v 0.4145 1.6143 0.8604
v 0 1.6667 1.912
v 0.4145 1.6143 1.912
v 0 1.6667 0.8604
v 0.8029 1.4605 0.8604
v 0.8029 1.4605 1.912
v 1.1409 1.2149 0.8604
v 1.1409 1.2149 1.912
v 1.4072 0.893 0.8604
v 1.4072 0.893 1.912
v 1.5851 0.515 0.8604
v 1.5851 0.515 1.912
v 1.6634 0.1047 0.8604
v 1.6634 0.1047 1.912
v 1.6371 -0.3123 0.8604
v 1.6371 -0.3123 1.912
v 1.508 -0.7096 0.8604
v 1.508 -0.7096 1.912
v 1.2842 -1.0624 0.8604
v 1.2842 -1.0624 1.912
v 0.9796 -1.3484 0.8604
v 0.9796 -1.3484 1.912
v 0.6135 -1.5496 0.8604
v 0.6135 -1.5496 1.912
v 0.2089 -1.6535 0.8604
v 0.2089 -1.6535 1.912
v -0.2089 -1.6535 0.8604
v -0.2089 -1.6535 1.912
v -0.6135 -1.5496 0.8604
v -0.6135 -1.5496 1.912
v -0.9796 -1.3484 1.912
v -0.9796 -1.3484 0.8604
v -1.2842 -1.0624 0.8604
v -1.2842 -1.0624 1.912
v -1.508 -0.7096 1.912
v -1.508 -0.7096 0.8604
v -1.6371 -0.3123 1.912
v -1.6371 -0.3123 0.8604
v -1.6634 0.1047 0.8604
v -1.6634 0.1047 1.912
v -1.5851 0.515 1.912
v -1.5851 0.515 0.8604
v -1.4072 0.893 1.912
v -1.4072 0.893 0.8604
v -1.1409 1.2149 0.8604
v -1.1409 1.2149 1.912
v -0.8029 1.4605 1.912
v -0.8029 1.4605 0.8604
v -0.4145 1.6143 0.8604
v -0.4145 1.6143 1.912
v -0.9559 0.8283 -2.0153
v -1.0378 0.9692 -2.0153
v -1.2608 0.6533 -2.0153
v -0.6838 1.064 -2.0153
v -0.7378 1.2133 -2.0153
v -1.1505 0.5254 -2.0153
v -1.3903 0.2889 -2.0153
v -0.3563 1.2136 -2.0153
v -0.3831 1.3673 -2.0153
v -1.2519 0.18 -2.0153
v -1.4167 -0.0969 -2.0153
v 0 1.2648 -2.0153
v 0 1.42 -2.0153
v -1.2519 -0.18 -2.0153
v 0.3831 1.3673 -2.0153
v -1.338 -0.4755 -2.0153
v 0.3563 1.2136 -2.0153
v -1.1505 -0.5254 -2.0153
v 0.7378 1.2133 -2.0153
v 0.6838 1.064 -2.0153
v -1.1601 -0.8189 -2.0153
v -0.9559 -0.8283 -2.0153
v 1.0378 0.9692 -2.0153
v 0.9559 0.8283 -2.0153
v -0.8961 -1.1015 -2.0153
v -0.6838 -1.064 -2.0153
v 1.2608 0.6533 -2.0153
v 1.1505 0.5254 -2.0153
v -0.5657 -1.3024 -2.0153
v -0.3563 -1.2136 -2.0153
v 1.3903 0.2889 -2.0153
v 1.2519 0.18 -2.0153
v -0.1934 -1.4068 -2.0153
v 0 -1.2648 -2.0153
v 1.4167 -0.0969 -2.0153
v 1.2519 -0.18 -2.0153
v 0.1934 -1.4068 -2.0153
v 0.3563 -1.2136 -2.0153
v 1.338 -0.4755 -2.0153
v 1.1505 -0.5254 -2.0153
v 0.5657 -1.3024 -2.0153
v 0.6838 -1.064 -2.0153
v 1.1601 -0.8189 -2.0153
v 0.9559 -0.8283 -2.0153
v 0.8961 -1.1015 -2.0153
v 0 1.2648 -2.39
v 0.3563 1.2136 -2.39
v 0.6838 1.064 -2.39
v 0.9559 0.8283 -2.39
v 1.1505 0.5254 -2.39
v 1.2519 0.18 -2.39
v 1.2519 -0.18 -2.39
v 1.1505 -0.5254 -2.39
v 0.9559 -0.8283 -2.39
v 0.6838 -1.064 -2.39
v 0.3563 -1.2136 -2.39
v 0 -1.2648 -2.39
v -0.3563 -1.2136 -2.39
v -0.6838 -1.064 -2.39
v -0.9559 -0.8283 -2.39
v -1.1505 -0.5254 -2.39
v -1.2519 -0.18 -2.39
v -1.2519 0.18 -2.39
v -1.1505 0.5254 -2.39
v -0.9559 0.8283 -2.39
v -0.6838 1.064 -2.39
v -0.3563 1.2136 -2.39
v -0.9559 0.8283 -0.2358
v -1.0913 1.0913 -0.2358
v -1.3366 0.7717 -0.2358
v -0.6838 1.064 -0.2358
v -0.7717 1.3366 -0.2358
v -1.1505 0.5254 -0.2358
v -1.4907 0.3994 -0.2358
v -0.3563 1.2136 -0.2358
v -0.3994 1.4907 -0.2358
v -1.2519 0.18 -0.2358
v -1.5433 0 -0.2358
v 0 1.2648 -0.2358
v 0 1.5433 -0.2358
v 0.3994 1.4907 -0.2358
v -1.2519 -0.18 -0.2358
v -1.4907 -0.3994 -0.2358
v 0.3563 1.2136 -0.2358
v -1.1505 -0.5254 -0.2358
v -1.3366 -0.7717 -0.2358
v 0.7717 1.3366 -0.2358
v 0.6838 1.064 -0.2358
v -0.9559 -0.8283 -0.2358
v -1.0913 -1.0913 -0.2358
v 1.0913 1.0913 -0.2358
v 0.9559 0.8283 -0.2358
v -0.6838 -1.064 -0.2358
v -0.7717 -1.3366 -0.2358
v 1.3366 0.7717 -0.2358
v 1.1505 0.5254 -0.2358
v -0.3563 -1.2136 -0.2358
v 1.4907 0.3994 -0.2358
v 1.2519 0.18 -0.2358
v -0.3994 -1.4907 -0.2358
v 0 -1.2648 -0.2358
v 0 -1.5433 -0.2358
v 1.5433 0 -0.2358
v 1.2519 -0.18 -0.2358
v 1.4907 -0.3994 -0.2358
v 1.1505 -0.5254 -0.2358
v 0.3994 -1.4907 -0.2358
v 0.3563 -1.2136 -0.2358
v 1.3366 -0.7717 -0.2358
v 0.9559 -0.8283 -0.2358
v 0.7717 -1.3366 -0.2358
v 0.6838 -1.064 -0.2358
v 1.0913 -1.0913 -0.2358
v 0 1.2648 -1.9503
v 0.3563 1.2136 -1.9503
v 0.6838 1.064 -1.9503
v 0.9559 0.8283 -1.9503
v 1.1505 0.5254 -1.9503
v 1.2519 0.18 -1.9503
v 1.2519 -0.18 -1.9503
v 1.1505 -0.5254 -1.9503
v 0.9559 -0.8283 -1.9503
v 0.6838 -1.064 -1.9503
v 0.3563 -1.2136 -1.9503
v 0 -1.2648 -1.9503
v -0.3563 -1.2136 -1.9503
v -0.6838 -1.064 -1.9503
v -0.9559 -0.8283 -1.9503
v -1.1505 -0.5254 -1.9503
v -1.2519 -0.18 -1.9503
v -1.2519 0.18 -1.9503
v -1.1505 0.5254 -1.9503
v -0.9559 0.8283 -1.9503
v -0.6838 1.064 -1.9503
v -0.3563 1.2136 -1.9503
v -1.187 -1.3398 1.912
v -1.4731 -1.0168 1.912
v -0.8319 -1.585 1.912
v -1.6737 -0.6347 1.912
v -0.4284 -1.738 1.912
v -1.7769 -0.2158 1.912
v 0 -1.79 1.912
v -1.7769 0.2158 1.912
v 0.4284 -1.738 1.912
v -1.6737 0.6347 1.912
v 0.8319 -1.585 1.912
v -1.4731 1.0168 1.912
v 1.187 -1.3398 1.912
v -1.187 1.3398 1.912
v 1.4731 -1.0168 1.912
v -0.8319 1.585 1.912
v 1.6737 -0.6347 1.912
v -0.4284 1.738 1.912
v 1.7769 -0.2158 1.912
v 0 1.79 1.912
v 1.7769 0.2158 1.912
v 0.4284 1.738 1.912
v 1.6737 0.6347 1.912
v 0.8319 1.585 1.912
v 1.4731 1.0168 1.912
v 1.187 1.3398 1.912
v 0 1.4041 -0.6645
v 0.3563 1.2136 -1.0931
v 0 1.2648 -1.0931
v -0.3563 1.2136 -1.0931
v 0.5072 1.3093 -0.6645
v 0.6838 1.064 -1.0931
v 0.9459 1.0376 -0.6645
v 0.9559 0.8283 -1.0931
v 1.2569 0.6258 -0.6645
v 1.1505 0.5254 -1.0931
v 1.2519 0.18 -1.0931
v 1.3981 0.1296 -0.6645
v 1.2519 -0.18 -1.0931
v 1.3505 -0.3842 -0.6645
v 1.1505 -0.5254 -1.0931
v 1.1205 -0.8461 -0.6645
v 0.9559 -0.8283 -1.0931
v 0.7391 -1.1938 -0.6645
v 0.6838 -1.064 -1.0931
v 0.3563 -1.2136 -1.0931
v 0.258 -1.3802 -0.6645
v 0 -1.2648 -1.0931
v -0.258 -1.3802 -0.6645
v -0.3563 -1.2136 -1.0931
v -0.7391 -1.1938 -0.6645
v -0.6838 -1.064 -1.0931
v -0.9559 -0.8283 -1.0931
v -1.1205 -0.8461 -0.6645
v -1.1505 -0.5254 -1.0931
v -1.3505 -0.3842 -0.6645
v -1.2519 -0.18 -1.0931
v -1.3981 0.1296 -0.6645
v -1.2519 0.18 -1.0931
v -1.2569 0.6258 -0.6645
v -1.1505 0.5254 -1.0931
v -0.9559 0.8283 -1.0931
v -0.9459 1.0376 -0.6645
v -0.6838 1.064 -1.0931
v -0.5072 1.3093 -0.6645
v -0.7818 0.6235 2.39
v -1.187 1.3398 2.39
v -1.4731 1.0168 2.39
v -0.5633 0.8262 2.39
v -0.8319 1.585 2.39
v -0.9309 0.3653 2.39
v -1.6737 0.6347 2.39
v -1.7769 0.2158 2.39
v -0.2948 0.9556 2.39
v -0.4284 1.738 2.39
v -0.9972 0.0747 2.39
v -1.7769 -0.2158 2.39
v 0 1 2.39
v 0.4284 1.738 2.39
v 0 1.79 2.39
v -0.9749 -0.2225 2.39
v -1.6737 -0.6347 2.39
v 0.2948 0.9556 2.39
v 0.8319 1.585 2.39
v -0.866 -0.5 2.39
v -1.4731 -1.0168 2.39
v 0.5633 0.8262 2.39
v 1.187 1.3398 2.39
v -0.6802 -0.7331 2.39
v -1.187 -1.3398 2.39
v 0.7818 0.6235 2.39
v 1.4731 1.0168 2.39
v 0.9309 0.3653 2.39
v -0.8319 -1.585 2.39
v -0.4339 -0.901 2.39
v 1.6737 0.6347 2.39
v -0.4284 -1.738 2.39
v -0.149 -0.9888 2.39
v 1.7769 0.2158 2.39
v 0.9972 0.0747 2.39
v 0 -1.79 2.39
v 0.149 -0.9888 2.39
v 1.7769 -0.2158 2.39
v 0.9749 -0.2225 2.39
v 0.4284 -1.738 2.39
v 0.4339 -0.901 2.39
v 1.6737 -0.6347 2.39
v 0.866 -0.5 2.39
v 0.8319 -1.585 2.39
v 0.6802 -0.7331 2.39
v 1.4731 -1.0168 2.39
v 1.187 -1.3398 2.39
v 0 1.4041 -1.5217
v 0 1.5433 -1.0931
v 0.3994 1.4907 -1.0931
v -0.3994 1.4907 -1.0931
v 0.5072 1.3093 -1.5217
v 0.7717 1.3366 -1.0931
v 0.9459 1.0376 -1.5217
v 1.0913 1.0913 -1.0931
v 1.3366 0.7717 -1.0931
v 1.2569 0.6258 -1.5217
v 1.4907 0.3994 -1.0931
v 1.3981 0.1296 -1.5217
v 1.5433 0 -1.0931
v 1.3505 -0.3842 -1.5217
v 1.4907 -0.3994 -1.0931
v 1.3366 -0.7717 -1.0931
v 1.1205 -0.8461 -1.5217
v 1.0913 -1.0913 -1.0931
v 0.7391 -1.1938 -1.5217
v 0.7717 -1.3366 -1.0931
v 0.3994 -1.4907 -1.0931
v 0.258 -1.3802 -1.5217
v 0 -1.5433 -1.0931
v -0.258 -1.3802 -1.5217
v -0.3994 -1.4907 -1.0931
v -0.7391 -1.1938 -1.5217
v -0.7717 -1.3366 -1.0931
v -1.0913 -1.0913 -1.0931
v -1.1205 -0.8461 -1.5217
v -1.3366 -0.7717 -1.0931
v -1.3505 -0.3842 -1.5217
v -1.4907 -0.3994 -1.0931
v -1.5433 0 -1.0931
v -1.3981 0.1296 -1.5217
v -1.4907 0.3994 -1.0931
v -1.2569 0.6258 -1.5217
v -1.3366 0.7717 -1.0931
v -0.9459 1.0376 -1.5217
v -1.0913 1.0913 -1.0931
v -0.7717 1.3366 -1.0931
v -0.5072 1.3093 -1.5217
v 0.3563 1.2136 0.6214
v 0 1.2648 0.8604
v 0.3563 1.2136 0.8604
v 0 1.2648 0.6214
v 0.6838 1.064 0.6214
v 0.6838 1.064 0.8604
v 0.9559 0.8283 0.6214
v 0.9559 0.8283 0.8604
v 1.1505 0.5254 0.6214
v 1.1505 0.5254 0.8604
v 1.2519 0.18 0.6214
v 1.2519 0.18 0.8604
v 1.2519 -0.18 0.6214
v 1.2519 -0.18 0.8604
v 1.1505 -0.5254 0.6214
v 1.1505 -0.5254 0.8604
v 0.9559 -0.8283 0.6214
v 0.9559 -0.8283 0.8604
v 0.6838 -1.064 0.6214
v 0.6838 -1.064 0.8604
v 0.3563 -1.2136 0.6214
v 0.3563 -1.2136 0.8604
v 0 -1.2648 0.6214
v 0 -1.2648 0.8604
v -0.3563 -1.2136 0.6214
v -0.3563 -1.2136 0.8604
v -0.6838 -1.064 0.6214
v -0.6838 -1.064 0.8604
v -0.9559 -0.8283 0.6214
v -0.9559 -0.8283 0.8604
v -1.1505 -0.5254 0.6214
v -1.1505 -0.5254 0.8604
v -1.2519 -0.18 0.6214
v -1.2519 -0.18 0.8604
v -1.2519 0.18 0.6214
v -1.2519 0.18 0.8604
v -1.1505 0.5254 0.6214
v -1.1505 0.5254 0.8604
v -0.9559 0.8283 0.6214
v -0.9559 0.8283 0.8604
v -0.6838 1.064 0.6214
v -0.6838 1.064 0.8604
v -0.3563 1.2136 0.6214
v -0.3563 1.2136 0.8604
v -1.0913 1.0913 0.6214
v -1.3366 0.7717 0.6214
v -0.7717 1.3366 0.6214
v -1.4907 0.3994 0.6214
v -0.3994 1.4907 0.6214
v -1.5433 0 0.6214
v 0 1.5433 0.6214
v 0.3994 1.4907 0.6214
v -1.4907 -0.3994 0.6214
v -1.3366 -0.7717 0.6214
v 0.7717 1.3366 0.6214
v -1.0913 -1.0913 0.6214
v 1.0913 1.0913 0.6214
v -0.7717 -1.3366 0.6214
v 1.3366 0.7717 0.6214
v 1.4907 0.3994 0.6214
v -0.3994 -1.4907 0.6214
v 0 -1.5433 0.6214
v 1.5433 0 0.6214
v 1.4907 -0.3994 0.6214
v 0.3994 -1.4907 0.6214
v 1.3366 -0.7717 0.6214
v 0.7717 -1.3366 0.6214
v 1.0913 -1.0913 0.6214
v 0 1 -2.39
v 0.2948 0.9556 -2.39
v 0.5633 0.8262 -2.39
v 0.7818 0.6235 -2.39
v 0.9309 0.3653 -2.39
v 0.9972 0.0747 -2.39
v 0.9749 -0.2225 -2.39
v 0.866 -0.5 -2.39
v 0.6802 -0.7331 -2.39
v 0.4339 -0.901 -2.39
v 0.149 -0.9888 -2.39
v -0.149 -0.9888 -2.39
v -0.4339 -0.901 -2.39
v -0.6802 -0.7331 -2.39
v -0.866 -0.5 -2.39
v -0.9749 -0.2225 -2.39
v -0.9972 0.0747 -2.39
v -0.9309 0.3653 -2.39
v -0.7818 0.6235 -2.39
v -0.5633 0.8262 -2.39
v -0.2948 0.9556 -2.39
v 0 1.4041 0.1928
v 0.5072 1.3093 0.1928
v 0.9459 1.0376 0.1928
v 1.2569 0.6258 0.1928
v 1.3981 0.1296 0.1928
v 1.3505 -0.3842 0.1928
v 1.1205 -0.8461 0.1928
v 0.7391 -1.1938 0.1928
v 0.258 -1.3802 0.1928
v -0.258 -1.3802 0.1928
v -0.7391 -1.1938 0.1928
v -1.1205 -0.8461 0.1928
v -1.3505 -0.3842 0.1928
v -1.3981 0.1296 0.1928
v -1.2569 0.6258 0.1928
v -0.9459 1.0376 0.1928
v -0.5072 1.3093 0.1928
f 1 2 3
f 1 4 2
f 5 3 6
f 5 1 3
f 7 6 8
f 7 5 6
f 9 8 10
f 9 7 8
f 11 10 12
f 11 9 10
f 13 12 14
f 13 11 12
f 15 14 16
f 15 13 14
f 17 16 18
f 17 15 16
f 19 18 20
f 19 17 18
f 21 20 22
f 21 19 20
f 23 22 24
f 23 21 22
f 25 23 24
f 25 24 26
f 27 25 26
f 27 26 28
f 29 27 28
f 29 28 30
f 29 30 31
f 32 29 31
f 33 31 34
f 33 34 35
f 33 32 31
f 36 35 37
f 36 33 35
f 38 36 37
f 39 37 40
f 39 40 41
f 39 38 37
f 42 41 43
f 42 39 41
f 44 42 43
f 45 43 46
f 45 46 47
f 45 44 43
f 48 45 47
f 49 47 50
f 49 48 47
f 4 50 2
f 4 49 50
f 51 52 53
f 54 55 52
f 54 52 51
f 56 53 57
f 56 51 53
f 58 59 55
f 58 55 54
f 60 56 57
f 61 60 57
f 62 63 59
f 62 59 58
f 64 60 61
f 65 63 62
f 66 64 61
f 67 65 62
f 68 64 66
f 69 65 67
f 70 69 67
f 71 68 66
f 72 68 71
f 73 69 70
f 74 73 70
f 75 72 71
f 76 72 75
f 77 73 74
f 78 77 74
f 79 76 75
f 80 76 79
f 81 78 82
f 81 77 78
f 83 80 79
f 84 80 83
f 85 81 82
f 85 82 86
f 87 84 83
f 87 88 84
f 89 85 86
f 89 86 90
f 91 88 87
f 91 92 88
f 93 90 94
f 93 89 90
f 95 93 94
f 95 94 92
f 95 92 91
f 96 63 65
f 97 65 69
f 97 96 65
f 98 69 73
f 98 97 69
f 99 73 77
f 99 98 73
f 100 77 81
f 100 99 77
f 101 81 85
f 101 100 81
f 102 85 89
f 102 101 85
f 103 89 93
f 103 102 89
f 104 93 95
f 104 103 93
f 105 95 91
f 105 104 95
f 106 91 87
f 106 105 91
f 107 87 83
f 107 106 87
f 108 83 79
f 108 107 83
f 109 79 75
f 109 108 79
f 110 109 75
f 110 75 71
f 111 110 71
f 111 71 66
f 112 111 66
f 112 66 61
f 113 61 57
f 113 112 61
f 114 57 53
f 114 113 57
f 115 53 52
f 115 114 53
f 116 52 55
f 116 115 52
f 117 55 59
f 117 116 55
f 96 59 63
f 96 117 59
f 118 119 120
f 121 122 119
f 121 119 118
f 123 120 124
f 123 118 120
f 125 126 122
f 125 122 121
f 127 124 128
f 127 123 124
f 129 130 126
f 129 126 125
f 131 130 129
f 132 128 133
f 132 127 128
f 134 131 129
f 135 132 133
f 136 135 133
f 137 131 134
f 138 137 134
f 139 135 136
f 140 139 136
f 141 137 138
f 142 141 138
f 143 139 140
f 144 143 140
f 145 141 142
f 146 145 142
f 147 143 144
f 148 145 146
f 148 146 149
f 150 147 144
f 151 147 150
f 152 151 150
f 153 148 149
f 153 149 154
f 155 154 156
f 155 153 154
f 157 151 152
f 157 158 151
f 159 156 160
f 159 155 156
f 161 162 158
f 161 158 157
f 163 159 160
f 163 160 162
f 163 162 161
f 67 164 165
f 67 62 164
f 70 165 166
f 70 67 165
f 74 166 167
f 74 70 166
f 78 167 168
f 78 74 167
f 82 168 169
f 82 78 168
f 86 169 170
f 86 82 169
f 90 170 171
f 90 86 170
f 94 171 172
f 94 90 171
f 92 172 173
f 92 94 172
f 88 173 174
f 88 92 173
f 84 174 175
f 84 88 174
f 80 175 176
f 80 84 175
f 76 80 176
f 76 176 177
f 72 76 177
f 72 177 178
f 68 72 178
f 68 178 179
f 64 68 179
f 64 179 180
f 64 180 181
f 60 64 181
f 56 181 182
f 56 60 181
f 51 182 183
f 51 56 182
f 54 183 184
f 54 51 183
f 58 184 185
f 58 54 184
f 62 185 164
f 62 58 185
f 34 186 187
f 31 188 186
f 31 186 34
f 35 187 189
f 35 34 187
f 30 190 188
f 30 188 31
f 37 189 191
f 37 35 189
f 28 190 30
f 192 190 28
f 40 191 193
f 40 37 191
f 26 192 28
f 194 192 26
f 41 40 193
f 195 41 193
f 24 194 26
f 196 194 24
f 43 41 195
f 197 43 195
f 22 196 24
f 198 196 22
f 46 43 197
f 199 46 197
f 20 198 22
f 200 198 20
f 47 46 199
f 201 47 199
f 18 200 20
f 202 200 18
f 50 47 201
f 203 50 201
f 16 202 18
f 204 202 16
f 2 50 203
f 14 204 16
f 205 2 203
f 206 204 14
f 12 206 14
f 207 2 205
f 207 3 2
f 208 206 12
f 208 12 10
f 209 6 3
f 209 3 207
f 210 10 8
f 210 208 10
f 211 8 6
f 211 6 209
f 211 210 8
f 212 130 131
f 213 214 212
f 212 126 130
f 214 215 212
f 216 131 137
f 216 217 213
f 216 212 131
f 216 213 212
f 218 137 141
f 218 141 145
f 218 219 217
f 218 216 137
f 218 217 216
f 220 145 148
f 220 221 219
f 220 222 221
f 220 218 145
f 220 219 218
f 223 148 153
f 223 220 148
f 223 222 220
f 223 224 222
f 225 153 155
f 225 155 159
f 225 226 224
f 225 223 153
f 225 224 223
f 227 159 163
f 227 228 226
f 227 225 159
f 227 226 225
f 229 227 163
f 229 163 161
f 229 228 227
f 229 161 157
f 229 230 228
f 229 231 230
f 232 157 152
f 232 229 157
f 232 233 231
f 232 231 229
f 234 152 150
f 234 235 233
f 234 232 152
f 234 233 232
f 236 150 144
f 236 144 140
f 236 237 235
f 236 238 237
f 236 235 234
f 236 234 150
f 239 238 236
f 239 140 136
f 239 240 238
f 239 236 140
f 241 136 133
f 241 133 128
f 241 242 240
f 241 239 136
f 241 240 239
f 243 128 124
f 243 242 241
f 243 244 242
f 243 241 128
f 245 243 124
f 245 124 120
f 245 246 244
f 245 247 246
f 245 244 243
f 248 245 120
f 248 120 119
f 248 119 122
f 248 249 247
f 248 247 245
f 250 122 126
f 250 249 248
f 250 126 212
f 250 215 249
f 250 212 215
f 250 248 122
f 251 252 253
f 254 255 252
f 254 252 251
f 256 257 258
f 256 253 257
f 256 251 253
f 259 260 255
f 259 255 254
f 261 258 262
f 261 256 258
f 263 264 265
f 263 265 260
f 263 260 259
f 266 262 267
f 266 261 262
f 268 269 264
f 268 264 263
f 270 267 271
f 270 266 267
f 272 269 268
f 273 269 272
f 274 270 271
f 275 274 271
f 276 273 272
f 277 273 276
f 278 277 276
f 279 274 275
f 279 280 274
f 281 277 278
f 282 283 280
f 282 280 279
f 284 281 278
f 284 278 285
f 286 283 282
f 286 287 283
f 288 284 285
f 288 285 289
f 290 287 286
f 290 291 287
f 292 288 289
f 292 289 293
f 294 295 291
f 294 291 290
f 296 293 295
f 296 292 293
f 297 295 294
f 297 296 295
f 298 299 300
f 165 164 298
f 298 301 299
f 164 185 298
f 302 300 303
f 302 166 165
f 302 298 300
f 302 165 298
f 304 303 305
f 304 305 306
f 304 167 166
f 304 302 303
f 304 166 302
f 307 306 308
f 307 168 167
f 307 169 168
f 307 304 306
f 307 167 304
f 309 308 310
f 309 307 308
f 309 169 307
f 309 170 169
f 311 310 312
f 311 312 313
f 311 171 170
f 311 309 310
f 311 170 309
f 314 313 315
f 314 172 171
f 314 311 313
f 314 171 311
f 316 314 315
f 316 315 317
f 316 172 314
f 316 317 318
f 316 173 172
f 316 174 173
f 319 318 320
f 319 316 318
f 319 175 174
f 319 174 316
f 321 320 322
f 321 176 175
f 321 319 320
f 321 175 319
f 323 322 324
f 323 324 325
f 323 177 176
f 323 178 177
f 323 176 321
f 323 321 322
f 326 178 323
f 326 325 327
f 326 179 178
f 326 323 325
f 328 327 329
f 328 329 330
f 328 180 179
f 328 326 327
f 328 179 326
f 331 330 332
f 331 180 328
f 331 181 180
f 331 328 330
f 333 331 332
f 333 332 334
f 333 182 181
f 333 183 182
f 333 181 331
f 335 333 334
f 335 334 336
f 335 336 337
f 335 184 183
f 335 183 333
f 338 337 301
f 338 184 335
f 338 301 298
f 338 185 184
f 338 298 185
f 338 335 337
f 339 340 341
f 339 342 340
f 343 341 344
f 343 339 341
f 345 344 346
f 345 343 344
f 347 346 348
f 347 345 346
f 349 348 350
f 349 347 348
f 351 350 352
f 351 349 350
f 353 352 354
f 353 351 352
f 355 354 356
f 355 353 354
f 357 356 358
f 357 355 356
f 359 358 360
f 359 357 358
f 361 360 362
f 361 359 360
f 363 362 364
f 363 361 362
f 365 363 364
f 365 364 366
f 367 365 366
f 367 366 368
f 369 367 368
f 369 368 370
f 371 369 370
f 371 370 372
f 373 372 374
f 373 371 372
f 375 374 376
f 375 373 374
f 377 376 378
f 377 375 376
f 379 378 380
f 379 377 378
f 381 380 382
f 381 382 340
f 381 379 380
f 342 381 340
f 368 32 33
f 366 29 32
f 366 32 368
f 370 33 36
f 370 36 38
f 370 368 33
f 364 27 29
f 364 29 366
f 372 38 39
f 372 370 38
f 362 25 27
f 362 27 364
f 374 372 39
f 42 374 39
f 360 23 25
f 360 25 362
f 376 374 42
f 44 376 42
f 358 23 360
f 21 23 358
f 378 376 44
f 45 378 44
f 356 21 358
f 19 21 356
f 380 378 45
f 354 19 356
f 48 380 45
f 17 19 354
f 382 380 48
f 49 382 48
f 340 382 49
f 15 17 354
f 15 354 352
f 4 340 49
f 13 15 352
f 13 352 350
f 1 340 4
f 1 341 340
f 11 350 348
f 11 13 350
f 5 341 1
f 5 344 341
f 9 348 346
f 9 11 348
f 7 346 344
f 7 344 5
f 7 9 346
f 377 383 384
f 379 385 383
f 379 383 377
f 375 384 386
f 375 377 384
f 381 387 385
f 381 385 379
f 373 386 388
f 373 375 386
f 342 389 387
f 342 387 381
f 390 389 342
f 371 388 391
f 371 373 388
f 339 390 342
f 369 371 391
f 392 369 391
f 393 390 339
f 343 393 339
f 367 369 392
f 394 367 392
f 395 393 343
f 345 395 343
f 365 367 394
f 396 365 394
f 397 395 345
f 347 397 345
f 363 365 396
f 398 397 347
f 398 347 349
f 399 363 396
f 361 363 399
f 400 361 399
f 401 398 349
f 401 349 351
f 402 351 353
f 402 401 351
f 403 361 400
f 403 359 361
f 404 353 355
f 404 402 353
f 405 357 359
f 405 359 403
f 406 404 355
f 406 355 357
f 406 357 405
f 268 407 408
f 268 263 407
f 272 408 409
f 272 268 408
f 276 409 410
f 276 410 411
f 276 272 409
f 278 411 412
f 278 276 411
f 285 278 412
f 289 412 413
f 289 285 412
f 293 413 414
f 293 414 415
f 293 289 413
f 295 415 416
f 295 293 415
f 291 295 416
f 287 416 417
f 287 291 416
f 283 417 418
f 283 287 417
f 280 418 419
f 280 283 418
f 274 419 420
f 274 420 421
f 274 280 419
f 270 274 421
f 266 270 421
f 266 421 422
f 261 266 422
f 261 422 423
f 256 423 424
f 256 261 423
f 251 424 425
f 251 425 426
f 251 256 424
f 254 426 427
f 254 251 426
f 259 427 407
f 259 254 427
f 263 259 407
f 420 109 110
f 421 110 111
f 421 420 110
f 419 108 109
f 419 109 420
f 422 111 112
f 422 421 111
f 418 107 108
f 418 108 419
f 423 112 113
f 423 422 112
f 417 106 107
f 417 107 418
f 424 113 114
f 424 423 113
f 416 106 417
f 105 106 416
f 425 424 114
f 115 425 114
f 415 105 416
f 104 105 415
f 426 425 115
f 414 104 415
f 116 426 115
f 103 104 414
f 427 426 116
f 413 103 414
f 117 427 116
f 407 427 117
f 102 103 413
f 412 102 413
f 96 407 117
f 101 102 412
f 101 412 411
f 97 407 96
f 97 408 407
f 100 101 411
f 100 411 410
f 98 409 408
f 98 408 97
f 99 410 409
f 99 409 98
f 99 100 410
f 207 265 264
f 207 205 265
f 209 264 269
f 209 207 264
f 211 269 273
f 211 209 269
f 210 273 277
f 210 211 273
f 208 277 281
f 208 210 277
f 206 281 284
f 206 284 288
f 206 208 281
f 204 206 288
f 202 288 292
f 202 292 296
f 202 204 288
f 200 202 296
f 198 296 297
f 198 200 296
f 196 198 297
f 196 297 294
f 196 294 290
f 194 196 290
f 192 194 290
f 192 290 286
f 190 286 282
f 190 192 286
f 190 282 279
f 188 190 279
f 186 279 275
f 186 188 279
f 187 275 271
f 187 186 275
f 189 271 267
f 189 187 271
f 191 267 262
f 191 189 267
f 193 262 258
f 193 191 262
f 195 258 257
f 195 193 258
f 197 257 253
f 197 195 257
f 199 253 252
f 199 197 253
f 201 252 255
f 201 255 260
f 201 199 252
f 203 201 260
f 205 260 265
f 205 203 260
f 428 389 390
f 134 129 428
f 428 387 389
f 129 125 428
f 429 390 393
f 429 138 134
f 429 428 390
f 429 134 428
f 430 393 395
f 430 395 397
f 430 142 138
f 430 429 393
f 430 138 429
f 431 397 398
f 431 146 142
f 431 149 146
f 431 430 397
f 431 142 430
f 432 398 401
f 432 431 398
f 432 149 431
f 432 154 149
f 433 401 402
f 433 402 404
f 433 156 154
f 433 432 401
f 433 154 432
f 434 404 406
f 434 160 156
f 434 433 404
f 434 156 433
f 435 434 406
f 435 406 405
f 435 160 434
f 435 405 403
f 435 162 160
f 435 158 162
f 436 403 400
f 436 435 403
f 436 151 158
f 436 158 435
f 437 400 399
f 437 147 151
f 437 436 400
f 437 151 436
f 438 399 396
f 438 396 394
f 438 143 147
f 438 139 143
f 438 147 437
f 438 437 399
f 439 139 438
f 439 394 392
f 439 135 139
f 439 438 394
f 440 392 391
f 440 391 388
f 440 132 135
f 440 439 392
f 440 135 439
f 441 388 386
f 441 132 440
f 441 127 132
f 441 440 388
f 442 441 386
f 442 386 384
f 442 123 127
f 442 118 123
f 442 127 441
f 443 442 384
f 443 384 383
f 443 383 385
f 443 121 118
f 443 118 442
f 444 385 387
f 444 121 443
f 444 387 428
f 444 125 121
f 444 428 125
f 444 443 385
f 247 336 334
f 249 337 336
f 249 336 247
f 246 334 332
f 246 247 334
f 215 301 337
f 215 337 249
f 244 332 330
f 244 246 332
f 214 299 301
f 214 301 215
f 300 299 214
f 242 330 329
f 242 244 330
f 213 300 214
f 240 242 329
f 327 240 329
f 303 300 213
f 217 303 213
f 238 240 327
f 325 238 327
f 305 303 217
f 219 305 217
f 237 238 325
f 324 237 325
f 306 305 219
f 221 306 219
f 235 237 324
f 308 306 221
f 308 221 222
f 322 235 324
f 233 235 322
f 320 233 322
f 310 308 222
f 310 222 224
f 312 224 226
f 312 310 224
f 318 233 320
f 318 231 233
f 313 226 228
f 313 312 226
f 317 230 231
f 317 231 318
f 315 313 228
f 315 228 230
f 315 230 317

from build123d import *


with BuildPart() as part:
    # Sketch3 → Revolve1 (revolve)
    with BuildSketch(Plane(origin=(0, 0, 0), x_dir=(0, 0, -1), z_dir=(1, 0, 0))):
        Polygon((0.235837455, 1.2648), (0.235837455, 1.543333333), (1.093074909, 1.2648), (1.093074909, 1.543333333), (1.950312364, 1.2648), (2.015314055, 1.2648), (2.015314055, 1.42), (2.39, 1.2648), (2.39, 1), (-2.39, 1), (-2.39, 1.79), (-1.912, 1.79), (-1.912, 1.666666667), (-0.8604, 1.666666667), (-0.8604, 1.2648), (-0.6214, 1.2648), (-0.6214, 1.543333333), align=None)
    revolve(axis=Axis((0, 0, 2.39), (0, 0, -1)))


solid = part.part
